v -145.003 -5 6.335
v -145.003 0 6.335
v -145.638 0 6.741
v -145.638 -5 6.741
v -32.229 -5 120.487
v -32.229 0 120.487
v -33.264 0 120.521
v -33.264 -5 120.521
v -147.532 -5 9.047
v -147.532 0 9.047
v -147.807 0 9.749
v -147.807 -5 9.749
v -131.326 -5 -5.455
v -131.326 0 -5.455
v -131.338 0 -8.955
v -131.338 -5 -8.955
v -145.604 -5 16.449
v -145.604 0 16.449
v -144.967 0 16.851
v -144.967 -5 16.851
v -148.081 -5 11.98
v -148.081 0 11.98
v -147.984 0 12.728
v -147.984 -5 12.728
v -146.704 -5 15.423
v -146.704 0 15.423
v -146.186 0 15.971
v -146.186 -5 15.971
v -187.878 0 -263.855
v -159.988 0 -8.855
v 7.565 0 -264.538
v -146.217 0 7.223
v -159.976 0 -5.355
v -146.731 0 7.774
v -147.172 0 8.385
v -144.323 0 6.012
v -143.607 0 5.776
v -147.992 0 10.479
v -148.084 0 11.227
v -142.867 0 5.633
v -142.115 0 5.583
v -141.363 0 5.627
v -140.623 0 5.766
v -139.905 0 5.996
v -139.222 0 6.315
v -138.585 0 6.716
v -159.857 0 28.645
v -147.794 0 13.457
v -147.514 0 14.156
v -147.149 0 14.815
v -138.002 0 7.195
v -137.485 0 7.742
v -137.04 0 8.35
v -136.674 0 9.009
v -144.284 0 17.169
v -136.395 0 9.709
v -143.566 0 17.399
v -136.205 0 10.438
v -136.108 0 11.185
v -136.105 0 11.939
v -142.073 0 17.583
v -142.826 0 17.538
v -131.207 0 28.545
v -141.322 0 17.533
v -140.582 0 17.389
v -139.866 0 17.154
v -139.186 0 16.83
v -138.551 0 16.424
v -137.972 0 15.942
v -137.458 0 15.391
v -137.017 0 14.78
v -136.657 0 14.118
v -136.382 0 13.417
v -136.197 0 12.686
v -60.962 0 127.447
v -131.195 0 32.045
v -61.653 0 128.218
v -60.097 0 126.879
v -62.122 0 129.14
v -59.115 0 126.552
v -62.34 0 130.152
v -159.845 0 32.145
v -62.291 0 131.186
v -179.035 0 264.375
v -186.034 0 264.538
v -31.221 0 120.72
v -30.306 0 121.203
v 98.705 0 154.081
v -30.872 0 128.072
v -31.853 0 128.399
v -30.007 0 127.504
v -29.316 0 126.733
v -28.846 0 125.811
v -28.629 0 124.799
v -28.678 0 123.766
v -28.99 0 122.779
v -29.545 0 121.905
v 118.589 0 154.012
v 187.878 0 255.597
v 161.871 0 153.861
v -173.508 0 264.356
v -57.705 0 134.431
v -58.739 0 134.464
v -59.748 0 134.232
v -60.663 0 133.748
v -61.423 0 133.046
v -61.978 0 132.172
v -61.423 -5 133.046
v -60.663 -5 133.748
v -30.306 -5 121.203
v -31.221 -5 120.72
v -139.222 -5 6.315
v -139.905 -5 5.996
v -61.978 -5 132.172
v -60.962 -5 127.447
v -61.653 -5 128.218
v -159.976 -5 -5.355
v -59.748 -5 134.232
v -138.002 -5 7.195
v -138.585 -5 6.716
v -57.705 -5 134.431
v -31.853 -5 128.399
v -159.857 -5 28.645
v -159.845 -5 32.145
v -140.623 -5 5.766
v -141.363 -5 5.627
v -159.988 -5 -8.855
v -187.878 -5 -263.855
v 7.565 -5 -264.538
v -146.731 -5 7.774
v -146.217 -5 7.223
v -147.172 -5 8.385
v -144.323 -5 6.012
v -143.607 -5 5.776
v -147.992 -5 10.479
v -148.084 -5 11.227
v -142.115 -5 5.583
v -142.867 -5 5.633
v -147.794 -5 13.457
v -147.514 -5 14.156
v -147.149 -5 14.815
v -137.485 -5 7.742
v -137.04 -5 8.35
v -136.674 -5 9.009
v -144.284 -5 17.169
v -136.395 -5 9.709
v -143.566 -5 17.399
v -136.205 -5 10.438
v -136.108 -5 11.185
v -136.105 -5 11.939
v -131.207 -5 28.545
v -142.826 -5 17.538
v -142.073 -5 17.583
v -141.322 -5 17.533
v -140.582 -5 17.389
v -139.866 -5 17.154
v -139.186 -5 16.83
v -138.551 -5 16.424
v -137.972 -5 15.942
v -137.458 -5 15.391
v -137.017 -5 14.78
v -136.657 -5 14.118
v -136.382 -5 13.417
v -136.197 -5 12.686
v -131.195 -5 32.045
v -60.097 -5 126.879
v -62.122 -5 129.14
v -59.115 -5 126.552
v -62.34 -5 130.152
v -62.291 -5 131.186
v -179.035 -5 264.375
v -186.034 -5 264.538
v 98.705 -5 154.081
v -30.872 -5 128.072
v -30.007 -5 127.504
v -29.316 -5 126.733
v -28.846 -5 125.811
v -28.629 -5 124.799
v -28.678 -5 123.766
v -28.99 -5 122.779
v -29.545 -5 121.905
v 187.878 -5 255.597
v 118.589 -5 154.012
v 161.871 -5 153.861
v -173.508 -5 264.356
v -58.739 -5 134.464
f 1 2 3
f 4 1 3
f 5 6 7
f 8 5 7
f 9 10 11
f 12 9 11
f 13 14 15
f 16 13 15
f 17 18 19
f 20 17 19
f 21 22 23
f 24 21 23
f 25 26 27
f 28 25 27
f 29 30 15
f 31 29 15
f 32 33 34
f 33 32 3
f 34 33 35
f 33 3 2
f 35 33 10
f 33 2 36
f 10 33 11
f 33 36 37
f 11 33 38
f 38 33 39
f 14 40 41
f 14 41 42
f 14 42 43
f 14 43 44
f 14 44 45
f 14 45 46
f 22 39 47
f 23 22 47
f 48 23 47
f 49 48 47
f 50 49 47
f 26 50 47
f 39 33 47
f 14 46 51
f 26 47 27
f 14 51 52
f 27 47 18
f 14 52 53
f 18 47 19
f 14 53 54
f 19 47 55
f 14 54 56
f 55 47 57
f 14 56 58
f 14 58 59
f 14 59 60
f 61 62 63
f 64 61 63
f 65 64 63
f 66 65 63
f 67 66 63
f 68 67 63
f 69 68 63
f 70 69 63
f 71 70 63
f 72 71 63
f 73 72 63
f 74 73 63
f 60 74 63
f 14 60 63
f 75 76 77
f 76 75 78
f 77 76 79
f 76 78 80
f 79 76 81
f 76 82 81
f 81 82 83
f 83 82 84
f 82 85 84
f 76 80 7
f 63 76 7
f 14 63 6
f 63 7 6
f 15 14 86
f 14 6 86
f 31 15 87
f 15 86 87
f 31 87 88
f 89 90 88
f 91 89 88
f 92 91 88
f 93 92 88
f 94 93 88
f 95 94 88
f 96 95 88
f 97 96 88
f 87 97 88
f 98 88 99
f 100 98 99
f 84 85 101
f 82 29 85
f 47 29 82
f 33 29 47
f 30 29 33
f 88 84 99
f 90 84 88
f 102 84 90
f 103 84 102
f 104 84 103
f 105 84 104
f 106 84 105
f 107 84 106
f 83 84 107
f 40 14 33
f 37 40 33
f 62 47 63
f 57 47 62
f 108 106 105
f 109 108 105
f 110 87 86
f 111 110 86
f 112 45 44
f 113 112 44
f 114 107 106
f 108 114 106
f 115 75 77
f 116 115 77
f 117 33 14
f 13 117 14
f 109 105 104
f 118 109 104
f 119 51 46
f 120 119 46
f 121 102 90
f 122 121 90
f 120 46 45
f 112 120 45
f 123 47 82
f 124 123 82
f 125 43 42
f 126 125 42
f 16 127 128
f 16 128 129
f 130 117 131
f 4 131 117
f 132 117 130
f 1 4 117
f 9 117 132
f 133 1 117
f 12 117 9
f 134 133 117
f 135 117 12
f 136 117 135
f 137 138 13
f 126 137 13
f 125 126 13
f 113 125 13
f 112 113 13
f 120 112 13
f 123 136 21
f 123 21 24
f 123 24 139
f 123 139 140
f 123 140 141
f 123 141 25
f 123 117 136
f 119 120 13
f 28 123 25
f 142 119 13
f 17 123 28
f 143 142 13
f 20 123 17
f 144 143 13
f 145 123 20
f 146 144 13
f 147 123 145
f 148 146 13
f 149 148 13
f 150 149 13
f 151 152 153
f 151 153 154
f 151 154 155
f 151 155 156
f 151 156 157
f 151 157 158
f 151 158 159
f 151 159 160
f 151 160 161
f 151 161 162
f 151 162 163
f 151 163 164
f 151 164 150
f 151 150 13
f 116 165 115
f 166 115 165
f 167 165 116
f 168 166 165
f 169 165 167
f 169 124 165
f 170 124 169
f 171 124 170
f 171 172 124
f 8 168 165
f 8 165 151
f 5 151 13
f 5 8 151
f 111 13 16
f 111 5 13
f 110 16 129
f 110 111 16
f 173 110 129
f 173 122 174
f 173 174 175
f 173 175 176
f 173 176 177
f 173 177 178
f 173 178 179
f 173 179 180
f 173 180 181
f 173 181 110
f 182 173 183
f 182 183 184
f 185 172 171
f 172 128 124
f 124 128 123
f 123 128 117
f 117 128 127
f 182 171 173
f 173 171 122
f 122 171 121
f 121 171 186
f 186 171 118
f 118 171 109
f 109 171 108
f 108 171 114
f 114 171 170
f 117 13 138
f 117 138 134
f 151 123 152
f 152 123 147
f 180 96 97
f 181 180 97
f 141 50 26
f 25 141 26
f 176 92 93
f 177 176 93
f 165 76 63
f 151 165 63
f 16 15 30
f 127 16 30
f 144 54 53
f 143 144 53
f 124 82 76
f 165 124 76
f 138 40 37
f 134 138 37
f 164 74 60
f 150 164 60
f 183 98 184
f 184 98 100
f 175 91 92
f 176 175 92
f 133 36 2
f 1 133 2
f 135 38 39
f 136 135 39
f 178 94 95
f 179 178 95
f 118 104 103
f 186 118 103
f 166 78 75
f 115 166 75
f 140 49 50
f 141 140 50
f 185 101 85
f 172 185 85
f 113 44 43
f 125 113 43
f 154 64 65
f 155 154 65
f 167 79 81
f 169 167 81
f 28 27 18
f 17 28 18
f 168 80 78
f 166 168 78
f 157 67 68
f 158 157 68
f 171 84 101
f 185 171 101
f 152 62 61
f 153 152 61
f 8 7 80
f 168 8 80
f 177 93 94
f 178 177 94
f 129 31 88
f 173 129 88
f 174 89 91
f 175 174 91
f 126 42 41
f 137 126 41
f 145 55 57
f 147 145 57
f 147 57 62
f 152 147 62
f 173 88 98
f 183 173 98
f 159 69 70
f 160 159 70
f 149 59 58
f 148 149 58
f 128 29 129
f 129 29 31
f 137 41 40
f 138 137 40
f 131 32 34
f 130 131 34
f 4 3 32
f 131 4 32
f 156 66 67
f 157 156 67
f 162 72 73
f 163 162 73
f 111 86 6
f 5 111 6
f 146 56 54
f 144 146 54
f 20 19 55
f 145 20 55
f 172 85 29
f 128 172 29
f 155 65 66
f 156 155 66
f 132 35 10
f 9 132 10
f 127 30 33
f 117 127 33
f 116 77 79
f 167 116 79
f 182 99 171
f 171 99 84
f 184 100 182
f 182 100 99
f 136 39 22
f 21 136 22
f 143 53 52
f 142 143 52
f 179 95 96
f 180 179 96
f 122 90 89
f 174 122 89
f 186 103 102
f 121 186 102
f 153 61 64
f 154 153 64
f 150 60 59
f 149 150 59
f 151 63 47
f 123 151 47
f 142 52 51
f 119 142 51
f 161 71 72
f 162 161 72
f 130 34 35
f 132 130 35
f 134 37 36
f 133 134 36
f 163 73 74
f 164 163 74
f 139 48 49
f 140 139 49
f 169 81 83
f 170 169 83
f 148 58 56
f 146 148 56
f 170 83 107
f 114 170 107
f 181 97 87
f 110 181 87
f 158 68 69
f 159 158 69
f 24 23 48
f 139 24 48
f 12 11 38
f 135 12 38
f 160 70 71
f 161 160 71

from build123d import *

# Parameters (mm, degrees)
F1_DEPTH = 5


with BuildPart() as f1:
    # F0 (on Front) → F1 (new body)
    with BuildSketch(Plane.XZ):
        Polygon((-179.034567, 264.374884), (-173.507781, 264.35558), (-186.03374, 264.537622), align=None)
        Polygon((-179.034567, 264.374884), (-186.03374, 264.537622), (-187.878187, -263.855378), (7.564755, -264.537596), (98.705213, 154.081378), (118.589349, 154.011986), (161.871482, 153.860881), (187.878187, 255.596949), align=None)
        Polygon((-131.338066, -8.954973), (-159.987894, -8.854973), (-159.975677, -5.35498), (-131.325849, -5.45498), align=None, mode=Mode.SUBTRACT)
        Polygon((-148.081213, 11.980342), (-147.984185, 12.727559), (-147.794243, 13.456717), (-147.514412, 14.156309), (-147.149134, 14.815337), (-146.704101, 15.423363), (-146.186398, 15.970834), (-145.604154, 16.449091), (-144.966563, 16.850589), (-144.283659, 17.169028), (-143.566261, 17.399381), (-142.825622, 17.537989), (-142.073478, 17.582667), (-141.321638, 17.532731), (-140.58199, 17.388967), (-139.866192, 17.153611), (-139.185548, 16.830421), (-138.550777, 16.424453), (-137.971886, 15.942158), (-137.458018, 15.391079), (-137.017252, 14.779955), (-136.656572, 14.118412), (-136.381642, 13.416864), (-136.196807, 12.686411), (-136.10496, 11.938533), (-136.107602, 11.185068), (-136.204655, 10.437851), (-136.394571, 9.708693), (-136.674403, 9.009101), (-137.039706, 8.350072), (-137.484714, 7.742047), (-138.002416, 7.194575), (-138.584661, 6.716319), (-139.222251, 6.314796), (-139.905156, 5.996356), (-140.622553, 5.766029), (-141.363192, 5.627421), (-142.115362, 5.582742), (-142.867177, 5.632679), (-143.606825, 5.776443), (-144.322622, 6.011774), (-145.003266, 6.334989), (-145.638037, 6.740931), (-146.216929, 7.223252), (-146.730822, 7.77433), (-147.171562, 8.385454), (-147.532268, 9.046997), (-147.807197, 9.74852), (-147.992033, 10.478999), (-148.083854, 11.226851), align=None, mode=Mode.SUBTRACT)
        Polygon((-131.20718, 28.544799), (-159.857008, 28.644799), (-159.844791, 32.144792), (-131.194962, 32.044767), align=None, mode=Mode.SUBTRACT)
        Polygon((-32.229146, 120.487084), (-33.26351, 120.520638), (-59.115122, 126.551944), (-60.096933, 126.879198), (-60.962007, 127.447269), (-61.652506, 128.218159), (-62.122279, 129.140331), (-62.339906, 130.152115), (-62.290808, 131.185869), (-61.978311, 132.172481), (-61.423296, 133.045987), (-60.662845, 133.747993), (-59.747861, 134.231558), (-58.739456, 134.464323), (-57.705066, 134.43077), (-31.853454, 128.399489), (-30.871643, 128.07221), (-30.006569, 127.504139), (-29.31607, 126.733249), (-28.846297, 125.811077), (-28.628696, 124.799293), (-28.677768, 123.765539), (-28.990265, 122.778926), (-29.545305, 121.90542), (-30.305731, 121.203415), (-31.22074, 120.719875), align=None, mode=Mode.SUBTRACT)
    extrude(amount=F1_DEPTH)


solid = f1.part
